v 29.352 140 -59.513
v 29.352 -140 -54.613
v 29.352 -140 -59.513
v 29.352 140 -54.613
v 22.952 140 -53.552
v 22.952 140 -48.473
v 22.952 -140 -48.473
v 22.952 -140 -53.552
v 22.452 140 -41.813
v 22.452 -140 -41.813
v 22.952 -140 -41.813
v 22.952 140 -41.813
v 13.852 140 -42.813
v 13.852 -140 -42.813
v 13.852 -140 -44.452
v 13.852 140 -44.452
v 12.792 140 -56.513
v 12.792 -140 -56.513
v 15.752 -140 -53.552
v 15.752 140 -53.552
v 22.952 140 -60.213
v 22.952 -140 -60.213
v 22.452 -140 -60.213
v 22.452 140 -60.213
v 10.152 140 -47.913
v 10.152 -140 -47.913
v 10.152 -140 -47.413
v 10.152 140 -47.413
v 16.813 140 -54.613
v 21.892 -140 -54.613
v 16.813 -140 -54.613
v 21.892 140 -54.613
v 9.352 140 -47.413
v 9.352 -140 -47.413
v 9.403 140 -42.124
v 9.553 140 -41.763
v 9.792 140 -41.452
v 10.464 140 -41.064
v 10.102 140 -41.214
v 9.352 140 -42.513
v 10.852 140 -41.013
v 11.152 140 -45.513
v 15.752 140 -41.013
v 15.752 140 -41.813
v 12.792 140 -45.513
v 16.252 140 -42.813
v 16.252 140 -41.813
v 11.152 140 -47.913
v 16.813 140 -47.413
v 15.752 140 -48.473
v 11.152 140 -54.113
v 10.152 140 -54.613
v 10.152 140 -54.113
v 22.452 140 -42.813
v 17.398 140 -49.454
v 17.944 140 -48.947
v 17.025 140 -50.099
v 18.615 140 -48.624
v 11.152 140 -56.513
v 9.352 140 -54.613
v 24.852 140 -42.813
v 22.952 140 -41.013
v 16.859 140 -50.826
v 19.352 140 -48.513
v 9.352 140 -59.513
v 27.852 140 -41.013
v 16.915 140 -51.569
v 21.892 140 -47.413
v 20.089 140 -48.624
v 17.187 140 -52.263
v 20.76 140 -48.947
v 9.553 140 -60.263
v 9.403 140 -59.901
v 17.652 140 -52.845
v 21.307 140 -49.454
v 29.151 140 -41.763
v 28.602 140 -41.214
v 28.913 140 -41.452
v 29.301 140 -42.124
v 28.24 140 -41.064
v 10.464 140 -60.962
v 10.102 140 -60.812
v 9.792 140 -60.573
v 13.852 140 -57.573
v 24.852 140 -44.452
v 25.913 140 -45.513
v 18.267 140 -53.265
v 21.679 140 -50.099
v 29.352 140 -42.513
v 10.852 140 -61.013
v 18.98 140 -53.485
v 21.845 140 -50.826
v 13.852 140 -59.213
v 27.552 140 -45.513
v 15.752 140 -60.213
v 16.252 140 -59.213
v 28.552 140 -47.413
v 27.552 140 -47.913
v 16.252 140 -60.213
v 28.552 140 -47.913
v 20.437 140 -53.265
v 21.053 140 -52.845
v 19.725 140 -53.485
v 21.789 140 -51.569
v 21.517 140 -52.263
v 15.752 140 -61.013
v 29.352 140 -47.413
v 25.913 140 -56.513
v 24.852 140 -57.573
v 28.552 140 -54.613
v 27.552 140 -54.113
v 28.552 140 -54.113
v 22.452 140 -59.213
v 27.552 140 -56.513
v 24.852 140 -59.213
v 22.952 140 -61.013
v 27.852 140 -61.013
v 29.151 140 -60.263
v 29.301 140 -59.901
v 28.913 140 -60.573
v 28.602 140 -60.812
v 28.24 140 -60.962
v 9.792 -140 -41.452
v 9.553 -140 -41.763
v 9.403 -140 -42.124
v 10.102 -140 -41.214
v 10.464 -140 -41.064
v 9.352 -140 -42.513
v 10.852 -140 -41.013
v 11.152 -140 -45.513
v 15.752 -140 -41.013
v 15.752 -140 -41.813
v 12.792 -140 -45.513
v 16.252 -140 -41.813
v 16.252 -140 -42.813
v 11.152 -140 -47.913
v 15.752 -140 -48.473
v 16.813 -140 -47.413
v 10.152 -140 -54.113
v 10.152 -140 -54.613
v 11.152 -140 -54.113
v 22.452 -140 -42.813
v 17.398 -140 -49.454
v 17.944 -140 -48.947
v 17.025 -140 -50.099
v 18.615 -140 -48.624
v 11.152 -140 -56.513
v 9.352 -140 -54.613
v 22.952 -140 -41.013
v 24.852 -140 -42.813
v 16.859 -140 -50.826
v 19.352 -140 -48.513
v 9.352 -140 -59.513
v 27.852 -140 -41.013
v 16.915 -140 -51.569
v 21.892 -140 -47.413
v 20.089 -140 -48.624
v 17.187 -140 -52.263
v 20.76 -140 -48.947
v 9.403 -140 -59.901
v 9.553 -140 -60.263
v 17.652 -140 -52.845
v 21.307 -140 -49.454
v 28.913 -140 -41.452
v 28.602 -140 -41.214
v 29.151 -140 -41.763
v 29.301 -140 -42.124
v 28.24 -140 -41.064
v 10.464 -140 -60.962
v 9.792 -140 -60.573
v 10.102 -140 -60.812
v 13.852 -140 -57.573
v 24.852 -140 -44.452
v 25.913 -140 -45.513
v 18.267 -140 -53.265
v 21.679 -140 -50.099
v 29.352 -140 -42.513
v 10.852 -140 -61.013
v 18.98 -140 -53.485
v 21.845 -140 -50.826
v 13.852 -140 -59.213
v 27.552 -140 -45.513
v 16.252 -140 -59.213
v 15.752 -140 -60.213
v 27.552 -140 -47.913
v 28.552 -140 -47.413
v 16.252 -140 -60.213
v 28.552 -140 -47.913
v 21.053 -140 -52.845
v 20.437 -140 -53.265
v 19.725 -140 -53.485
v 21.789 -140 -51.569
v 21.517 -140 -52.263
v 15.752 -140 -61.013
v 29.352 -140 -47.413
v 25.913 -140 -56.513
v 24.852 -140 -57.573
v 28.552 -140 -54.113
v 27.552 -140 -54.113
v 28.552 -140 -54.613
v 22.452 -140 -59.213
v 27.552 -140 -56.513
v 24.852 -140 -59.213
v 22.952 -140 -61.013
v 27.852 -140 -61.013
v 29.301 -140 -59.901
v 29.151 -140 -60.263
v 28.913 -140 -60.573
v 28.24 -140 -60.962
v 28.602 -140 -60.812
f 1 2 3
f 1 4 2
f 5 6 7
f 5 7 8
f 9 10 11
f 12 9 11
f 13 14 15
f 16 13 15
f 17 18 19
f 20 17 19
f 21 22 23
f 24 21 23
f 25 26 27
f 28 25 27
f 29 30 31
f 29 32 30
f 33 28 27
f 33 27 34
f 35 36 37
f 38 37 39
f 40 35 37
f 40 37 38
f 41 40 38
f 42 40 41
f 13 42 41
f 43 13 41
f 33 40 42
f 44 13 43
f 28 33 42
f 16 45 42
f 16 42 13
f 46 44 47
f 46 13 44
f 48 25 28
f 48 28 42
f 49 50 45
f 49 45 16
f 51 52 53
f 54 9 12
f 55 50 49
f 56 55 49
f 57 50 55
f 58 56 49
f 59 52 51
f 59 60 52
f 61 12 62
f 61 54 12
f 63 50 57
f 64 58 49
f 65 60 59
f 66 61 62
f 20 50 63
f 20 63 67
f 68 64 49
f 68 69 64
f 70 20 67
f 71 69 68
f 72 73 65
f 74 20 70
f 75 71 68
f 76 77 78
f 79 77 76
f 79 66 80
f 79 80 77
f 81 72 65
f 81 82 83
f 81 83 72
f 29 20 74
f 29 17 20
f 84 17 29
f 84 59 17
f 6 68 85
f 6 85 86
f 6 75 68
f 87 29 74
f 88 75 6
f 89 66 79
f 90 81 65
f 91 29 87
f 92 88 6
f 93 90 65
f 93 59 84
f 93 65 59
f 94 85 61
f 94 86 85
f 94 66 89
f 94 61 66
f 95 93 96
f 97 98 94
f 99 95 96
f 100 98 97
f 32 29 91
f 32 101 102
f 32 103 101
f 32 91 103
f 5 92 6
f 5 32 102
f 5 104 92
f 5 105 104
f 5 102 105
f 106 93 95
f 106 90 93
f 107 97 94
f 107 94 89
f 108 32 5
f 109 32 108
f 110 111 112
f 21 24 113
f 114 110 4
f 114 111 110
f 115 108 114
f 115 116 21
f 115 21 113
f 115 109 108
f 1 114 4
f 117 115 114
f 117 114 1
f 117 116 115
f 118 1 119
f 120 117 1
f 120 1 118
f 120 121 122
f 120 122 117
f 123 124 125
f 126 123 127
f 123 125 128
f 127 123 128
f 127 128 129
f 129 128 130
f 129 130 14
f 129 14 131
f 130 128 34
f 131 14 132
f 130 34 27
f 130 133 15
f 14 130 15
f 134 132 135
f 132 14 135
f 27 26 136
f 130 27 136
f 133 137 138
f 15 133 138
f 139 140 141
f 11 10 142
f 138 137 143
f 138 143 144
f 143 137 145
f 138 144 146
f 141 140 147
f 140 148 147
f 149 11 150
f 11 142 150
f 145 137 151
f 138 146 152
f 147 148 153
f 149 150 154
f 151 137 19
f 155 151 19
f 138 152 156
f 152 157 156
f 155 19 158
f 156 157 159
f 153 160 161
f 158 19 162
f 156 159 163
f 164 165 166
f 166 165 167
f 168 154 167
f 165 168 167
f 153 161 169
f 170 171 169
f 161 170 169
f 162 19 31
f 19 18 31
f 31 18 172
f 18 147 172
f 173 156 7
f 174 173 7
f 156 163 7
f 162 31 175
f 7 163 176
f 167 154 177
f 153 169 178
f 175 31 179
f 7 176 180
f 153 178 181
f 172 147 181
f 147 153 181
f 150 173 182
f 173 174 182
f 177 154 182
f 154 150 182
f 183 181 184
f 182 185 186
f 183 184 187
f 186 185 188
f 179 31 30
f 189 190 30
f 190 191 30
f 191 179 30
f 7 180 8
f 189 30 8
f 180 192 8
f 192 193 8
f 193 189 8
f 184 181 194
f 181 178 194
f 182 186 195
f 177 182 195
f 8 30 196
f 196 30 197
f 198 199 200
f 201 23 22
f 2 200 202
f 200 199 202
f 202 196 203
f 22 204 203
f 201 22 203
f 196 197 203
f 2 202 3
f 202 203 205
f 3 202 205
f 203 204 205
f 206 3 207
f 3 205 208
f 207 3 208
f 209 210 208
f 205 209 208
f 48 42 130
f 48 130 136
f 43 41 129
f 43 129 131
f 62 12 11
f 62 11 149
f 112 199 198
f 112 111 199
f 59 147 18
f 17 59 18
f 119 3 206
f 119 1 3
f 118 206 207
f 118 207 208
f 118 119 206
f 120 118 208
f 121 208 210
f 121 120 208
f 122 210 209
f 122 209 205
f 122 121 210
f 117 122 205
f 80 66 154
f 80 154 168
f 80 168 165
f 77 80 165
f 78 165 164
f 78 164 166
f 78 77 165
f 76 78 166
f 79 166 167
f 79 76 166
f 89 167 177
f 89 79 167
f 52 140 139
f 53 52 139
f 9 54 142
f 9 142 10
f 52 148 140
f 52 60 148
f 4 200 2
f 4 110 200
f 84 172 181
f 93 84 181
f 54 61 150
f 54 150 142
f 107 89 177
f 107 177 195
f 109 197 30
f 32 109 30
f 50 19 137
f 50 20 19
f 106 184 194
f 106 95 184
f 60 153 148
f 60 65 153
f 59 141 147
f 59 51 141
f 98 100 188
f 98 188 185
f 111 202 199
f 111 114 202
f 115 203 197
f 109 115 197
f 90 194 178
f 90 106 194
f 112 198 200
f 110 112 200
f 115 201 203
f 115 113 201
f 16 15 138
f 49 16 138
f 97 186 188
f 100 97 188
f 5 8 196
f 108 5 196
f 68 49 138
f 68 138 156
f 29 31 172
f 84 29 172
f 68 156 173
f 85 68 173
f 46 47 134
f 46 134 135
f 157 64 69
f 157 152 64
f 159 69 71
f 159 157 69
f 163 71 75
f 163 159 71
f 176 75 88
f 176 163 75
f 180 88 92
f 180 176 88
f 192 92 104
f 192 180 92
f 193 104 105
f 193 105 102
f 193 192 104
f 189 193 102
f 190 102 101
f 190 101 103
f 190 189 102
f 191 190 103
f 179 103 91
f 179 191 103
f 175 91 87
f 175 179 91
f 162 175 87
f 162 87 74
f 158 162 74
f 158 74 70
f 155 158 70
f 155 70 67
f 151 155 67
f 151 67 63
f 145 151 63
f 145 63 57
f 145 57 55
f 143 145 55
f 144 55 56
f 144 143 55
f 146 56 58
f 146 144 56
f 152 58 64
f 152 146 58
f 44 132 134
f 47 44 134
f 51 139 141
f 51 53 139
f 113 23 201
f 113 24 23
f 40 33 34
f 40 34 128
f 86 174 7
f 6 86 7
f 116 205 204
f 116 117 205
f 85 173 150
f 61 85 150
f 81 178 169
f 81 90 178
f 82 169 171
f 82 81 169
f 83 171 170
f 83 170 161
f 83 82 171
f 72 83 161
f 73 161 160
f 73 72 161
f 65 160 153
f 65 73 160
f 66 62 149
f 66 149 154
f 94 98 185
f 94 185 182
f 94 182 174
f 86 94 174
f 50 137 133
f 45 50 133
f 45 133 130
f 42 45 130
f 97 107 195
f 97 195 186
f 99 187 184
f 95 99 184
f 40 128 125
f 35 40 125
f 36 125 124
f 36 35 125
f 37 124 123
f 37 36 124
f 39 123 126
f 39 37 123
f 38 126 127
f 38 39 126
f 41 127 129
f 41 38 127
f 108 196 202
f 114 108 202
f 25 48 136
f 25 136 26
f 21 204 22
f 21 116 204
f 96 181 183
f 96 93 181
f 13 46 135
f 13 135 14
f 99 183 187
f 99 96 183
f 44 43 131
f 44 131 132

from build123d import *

# Parameters (mm, degrees)
SKETCH_1_R      = 2.5
EXTRUDE_1_DEPTH = 140


with BuildPart() as part:
    # 草图1 → 凸台-拉伸1 (new, symmetric)
    with BuildSketch(Plane(origin=(0, 0, 0), x_dir=(1, 0, 0), z_dir=(0, 1, 0))):
        with BuildLine():
            Line((15.752176799, 53.551974455), (15.752176799, 48.473294799))
            Line((15.752176799, 48.473294799), (12.791516627, 45.512634627))
            Line((12.791516627, 45.512634627), (11.152176799, 45.512634627))
            Line((11.152176799, 45.512634627), (11.152176799, 47.912634627))
            Line((11.152176799, 47.912634627), (10.152176799, 47.912634627))
            Line((10.152176799, 47.912634627), (10.152176799, 47.412634627))
            Line((10.152176799, 47.412634627), (9.352176799, 47.412634627))
            Line((9.352176799, 47.412634627), (9.352176799, 42.512634627))
            ThreePointArc((9.352176799, 42.512634627), (9.791516627, 41.451974455), (10.852176799, 41.012634627))
            Line((10.852176799, 41.012634627), (15.752176799, 41.012634627))
            Line((15.752176799, 41.012634627), (15.752176799, 41.812634627))
            Line((15.752176799, 41.812634627), (16.252176799, 41.812634627))
            Line((16.252176799, 41.812634627), (16.252176799, 42.812634627))
            Line((16.252176799, 42.812634627), (13.852176799, 42.812634627))
            Line((13.852176799, 42.812634627), (13.852176799, 44.451974455))
            Line((13.852176799, 44.451974455), (16.812836971, 47.412634627))
            Line((16.812836971, 47.412634627), (21.891516627, 47.412634627))
            Line((21.891516627, 47.412634627), (24.852176799, 44.451974455))
            Line((24.852176799, 44.451974455), (24.852176799, 42.812634627))
            Line((24.852176799, 42.812634627), (22.452176799, 42.812634627))
            Line((22.452176799, 42.812634627), (22.452176799, 41.812634627))
            Line((22.452176799, 41.812634627), (22.952176799, 41.812634627))
            Line((22.952176799, 41.812634627), (22.952176799, 41.012634627))
            Line((22.952176799, 41.012634627), (27.852176799, 41.012634627))
            ThreePointArc((27.852176799, 41.012634627), (28.912836971, 41.451974455), (29.352176799, 42.512634627))
            Line((29.352176799, 42.512634627), (29.352176799, 47.412634627))
            Line((29.352176799, 47.412634627), (28.552176799, 47.412634627))
            Line((28.552176799, 47.412634627), (28.552176799, 47.912634627))
            Line((28.552176799, 47.912634627), (27.552176799, 47.912634627))
            Line((27.552176799, 47.912634627), (27.552176799, 45.512634627))
            Line((27.552176799, 45.512634627), (25.912836971, 45.512634627))
            Line((25.912836971, 45.512634627), (22.952176799, 48.473294799))
            Line((22.952176799, 48.473294799), (22.952176799, 53.551974455))
            Line((22.952176799, 53.551974455), (25.912836971, 56.512634627))
            Line((25.912836971, 56.512634627), (27.552176799, 56.512634627))
            Line((27.552176799, 56.512634627), (27.552176799, 54.112634627))
            Line((27.552176799, 54.112634627), (28.552176799, 54.112634627))
            Line((28.552176799, 54.112634627), (28.552176799, 54.612634627))
            Line((28.552176799, 54.612634627), (29.352176799, 54.612634627))
            Line((29.352176799, 54.612634627), (29.352176799, 59.512634627))
            ThreePointArc((29.352176799, 59.512634627), (28.912836971, 60.573294799), (27.852176799, 61.012634627))
            Line((27.852176799, 61.012634627), (22.952176799, 61.012634627))
            Line((22.952176799, 61.012634627), (22.952176799, 60.212634627))
            Line((22.952176799, 60.212634627), (22.452176799, 60.212634627))
            Line((22.452176799, 60.212634627), (22.452176799, 59.212634627))
            Line((22.452176799, 59.212634627), (24.852176799, 59.212634627))
            Line((24.852176799, 59.212634627), (24.852176799, 57.573294799))
            Line((24.852176799, 57.573294799), (21.891516627, 54.612634627))
            Line((21.891516627, 54.612634627), (16.812836971, 54.612634627))
            Line((16.812836971, 54.612634627), (13.852176799, 57.573294799))
            Line((13.852176799, 57.573294799), (13.852176799, 59.212634627))
            Line((13.852176799, 59.212634627), (16.252176799, 59.212634627))
            Line((16.252176799, 59.212634627), (16.252176799, 60.212634627))
            Line((16.252176799, 60.212634627), (15.752176799, 60.212634627))
            Line((15.752176799, 60.212634627), (15.752176799, 61.012634627))
            Line((15.752176799, 61.012634627), (10.852176799, 61.012634627))
            ThreePointArc((10.852176799, 61.012634627), (9.791516627, 60.573294799), (9.352176799, 59.512634627))
            Line((9.352176799, 59.512634627), (9.352176799, 54.612634627))
            Line((9.352176799, 54.612634627), (10.152176799, 54.612634627))
            Line((10.152176799, 54.612634627), (10.152176799, 54.112634627))
            Line((10.152176799, 54.112634627), (11.152176799, 54.112634627))
            Line((11.152176799, 54.112634627), (11.152176799, 56.512634627))
            Line((11.152176799, 56.512634627), (12.791516627, 56.512634627))
            Line((12.791516627, 56.512634627), (15.752176799, 53.551974455))
        make_face()
        with Locations(Location((19.352176799, 51.012634627, 0), (0, 0, 270))):
            Circle(SKETCH_1_R, mode=Mode.SUBTRACT)
    extrude(amount=EXTRUDE_1_DEPTH, both=True)


solid = part.part
